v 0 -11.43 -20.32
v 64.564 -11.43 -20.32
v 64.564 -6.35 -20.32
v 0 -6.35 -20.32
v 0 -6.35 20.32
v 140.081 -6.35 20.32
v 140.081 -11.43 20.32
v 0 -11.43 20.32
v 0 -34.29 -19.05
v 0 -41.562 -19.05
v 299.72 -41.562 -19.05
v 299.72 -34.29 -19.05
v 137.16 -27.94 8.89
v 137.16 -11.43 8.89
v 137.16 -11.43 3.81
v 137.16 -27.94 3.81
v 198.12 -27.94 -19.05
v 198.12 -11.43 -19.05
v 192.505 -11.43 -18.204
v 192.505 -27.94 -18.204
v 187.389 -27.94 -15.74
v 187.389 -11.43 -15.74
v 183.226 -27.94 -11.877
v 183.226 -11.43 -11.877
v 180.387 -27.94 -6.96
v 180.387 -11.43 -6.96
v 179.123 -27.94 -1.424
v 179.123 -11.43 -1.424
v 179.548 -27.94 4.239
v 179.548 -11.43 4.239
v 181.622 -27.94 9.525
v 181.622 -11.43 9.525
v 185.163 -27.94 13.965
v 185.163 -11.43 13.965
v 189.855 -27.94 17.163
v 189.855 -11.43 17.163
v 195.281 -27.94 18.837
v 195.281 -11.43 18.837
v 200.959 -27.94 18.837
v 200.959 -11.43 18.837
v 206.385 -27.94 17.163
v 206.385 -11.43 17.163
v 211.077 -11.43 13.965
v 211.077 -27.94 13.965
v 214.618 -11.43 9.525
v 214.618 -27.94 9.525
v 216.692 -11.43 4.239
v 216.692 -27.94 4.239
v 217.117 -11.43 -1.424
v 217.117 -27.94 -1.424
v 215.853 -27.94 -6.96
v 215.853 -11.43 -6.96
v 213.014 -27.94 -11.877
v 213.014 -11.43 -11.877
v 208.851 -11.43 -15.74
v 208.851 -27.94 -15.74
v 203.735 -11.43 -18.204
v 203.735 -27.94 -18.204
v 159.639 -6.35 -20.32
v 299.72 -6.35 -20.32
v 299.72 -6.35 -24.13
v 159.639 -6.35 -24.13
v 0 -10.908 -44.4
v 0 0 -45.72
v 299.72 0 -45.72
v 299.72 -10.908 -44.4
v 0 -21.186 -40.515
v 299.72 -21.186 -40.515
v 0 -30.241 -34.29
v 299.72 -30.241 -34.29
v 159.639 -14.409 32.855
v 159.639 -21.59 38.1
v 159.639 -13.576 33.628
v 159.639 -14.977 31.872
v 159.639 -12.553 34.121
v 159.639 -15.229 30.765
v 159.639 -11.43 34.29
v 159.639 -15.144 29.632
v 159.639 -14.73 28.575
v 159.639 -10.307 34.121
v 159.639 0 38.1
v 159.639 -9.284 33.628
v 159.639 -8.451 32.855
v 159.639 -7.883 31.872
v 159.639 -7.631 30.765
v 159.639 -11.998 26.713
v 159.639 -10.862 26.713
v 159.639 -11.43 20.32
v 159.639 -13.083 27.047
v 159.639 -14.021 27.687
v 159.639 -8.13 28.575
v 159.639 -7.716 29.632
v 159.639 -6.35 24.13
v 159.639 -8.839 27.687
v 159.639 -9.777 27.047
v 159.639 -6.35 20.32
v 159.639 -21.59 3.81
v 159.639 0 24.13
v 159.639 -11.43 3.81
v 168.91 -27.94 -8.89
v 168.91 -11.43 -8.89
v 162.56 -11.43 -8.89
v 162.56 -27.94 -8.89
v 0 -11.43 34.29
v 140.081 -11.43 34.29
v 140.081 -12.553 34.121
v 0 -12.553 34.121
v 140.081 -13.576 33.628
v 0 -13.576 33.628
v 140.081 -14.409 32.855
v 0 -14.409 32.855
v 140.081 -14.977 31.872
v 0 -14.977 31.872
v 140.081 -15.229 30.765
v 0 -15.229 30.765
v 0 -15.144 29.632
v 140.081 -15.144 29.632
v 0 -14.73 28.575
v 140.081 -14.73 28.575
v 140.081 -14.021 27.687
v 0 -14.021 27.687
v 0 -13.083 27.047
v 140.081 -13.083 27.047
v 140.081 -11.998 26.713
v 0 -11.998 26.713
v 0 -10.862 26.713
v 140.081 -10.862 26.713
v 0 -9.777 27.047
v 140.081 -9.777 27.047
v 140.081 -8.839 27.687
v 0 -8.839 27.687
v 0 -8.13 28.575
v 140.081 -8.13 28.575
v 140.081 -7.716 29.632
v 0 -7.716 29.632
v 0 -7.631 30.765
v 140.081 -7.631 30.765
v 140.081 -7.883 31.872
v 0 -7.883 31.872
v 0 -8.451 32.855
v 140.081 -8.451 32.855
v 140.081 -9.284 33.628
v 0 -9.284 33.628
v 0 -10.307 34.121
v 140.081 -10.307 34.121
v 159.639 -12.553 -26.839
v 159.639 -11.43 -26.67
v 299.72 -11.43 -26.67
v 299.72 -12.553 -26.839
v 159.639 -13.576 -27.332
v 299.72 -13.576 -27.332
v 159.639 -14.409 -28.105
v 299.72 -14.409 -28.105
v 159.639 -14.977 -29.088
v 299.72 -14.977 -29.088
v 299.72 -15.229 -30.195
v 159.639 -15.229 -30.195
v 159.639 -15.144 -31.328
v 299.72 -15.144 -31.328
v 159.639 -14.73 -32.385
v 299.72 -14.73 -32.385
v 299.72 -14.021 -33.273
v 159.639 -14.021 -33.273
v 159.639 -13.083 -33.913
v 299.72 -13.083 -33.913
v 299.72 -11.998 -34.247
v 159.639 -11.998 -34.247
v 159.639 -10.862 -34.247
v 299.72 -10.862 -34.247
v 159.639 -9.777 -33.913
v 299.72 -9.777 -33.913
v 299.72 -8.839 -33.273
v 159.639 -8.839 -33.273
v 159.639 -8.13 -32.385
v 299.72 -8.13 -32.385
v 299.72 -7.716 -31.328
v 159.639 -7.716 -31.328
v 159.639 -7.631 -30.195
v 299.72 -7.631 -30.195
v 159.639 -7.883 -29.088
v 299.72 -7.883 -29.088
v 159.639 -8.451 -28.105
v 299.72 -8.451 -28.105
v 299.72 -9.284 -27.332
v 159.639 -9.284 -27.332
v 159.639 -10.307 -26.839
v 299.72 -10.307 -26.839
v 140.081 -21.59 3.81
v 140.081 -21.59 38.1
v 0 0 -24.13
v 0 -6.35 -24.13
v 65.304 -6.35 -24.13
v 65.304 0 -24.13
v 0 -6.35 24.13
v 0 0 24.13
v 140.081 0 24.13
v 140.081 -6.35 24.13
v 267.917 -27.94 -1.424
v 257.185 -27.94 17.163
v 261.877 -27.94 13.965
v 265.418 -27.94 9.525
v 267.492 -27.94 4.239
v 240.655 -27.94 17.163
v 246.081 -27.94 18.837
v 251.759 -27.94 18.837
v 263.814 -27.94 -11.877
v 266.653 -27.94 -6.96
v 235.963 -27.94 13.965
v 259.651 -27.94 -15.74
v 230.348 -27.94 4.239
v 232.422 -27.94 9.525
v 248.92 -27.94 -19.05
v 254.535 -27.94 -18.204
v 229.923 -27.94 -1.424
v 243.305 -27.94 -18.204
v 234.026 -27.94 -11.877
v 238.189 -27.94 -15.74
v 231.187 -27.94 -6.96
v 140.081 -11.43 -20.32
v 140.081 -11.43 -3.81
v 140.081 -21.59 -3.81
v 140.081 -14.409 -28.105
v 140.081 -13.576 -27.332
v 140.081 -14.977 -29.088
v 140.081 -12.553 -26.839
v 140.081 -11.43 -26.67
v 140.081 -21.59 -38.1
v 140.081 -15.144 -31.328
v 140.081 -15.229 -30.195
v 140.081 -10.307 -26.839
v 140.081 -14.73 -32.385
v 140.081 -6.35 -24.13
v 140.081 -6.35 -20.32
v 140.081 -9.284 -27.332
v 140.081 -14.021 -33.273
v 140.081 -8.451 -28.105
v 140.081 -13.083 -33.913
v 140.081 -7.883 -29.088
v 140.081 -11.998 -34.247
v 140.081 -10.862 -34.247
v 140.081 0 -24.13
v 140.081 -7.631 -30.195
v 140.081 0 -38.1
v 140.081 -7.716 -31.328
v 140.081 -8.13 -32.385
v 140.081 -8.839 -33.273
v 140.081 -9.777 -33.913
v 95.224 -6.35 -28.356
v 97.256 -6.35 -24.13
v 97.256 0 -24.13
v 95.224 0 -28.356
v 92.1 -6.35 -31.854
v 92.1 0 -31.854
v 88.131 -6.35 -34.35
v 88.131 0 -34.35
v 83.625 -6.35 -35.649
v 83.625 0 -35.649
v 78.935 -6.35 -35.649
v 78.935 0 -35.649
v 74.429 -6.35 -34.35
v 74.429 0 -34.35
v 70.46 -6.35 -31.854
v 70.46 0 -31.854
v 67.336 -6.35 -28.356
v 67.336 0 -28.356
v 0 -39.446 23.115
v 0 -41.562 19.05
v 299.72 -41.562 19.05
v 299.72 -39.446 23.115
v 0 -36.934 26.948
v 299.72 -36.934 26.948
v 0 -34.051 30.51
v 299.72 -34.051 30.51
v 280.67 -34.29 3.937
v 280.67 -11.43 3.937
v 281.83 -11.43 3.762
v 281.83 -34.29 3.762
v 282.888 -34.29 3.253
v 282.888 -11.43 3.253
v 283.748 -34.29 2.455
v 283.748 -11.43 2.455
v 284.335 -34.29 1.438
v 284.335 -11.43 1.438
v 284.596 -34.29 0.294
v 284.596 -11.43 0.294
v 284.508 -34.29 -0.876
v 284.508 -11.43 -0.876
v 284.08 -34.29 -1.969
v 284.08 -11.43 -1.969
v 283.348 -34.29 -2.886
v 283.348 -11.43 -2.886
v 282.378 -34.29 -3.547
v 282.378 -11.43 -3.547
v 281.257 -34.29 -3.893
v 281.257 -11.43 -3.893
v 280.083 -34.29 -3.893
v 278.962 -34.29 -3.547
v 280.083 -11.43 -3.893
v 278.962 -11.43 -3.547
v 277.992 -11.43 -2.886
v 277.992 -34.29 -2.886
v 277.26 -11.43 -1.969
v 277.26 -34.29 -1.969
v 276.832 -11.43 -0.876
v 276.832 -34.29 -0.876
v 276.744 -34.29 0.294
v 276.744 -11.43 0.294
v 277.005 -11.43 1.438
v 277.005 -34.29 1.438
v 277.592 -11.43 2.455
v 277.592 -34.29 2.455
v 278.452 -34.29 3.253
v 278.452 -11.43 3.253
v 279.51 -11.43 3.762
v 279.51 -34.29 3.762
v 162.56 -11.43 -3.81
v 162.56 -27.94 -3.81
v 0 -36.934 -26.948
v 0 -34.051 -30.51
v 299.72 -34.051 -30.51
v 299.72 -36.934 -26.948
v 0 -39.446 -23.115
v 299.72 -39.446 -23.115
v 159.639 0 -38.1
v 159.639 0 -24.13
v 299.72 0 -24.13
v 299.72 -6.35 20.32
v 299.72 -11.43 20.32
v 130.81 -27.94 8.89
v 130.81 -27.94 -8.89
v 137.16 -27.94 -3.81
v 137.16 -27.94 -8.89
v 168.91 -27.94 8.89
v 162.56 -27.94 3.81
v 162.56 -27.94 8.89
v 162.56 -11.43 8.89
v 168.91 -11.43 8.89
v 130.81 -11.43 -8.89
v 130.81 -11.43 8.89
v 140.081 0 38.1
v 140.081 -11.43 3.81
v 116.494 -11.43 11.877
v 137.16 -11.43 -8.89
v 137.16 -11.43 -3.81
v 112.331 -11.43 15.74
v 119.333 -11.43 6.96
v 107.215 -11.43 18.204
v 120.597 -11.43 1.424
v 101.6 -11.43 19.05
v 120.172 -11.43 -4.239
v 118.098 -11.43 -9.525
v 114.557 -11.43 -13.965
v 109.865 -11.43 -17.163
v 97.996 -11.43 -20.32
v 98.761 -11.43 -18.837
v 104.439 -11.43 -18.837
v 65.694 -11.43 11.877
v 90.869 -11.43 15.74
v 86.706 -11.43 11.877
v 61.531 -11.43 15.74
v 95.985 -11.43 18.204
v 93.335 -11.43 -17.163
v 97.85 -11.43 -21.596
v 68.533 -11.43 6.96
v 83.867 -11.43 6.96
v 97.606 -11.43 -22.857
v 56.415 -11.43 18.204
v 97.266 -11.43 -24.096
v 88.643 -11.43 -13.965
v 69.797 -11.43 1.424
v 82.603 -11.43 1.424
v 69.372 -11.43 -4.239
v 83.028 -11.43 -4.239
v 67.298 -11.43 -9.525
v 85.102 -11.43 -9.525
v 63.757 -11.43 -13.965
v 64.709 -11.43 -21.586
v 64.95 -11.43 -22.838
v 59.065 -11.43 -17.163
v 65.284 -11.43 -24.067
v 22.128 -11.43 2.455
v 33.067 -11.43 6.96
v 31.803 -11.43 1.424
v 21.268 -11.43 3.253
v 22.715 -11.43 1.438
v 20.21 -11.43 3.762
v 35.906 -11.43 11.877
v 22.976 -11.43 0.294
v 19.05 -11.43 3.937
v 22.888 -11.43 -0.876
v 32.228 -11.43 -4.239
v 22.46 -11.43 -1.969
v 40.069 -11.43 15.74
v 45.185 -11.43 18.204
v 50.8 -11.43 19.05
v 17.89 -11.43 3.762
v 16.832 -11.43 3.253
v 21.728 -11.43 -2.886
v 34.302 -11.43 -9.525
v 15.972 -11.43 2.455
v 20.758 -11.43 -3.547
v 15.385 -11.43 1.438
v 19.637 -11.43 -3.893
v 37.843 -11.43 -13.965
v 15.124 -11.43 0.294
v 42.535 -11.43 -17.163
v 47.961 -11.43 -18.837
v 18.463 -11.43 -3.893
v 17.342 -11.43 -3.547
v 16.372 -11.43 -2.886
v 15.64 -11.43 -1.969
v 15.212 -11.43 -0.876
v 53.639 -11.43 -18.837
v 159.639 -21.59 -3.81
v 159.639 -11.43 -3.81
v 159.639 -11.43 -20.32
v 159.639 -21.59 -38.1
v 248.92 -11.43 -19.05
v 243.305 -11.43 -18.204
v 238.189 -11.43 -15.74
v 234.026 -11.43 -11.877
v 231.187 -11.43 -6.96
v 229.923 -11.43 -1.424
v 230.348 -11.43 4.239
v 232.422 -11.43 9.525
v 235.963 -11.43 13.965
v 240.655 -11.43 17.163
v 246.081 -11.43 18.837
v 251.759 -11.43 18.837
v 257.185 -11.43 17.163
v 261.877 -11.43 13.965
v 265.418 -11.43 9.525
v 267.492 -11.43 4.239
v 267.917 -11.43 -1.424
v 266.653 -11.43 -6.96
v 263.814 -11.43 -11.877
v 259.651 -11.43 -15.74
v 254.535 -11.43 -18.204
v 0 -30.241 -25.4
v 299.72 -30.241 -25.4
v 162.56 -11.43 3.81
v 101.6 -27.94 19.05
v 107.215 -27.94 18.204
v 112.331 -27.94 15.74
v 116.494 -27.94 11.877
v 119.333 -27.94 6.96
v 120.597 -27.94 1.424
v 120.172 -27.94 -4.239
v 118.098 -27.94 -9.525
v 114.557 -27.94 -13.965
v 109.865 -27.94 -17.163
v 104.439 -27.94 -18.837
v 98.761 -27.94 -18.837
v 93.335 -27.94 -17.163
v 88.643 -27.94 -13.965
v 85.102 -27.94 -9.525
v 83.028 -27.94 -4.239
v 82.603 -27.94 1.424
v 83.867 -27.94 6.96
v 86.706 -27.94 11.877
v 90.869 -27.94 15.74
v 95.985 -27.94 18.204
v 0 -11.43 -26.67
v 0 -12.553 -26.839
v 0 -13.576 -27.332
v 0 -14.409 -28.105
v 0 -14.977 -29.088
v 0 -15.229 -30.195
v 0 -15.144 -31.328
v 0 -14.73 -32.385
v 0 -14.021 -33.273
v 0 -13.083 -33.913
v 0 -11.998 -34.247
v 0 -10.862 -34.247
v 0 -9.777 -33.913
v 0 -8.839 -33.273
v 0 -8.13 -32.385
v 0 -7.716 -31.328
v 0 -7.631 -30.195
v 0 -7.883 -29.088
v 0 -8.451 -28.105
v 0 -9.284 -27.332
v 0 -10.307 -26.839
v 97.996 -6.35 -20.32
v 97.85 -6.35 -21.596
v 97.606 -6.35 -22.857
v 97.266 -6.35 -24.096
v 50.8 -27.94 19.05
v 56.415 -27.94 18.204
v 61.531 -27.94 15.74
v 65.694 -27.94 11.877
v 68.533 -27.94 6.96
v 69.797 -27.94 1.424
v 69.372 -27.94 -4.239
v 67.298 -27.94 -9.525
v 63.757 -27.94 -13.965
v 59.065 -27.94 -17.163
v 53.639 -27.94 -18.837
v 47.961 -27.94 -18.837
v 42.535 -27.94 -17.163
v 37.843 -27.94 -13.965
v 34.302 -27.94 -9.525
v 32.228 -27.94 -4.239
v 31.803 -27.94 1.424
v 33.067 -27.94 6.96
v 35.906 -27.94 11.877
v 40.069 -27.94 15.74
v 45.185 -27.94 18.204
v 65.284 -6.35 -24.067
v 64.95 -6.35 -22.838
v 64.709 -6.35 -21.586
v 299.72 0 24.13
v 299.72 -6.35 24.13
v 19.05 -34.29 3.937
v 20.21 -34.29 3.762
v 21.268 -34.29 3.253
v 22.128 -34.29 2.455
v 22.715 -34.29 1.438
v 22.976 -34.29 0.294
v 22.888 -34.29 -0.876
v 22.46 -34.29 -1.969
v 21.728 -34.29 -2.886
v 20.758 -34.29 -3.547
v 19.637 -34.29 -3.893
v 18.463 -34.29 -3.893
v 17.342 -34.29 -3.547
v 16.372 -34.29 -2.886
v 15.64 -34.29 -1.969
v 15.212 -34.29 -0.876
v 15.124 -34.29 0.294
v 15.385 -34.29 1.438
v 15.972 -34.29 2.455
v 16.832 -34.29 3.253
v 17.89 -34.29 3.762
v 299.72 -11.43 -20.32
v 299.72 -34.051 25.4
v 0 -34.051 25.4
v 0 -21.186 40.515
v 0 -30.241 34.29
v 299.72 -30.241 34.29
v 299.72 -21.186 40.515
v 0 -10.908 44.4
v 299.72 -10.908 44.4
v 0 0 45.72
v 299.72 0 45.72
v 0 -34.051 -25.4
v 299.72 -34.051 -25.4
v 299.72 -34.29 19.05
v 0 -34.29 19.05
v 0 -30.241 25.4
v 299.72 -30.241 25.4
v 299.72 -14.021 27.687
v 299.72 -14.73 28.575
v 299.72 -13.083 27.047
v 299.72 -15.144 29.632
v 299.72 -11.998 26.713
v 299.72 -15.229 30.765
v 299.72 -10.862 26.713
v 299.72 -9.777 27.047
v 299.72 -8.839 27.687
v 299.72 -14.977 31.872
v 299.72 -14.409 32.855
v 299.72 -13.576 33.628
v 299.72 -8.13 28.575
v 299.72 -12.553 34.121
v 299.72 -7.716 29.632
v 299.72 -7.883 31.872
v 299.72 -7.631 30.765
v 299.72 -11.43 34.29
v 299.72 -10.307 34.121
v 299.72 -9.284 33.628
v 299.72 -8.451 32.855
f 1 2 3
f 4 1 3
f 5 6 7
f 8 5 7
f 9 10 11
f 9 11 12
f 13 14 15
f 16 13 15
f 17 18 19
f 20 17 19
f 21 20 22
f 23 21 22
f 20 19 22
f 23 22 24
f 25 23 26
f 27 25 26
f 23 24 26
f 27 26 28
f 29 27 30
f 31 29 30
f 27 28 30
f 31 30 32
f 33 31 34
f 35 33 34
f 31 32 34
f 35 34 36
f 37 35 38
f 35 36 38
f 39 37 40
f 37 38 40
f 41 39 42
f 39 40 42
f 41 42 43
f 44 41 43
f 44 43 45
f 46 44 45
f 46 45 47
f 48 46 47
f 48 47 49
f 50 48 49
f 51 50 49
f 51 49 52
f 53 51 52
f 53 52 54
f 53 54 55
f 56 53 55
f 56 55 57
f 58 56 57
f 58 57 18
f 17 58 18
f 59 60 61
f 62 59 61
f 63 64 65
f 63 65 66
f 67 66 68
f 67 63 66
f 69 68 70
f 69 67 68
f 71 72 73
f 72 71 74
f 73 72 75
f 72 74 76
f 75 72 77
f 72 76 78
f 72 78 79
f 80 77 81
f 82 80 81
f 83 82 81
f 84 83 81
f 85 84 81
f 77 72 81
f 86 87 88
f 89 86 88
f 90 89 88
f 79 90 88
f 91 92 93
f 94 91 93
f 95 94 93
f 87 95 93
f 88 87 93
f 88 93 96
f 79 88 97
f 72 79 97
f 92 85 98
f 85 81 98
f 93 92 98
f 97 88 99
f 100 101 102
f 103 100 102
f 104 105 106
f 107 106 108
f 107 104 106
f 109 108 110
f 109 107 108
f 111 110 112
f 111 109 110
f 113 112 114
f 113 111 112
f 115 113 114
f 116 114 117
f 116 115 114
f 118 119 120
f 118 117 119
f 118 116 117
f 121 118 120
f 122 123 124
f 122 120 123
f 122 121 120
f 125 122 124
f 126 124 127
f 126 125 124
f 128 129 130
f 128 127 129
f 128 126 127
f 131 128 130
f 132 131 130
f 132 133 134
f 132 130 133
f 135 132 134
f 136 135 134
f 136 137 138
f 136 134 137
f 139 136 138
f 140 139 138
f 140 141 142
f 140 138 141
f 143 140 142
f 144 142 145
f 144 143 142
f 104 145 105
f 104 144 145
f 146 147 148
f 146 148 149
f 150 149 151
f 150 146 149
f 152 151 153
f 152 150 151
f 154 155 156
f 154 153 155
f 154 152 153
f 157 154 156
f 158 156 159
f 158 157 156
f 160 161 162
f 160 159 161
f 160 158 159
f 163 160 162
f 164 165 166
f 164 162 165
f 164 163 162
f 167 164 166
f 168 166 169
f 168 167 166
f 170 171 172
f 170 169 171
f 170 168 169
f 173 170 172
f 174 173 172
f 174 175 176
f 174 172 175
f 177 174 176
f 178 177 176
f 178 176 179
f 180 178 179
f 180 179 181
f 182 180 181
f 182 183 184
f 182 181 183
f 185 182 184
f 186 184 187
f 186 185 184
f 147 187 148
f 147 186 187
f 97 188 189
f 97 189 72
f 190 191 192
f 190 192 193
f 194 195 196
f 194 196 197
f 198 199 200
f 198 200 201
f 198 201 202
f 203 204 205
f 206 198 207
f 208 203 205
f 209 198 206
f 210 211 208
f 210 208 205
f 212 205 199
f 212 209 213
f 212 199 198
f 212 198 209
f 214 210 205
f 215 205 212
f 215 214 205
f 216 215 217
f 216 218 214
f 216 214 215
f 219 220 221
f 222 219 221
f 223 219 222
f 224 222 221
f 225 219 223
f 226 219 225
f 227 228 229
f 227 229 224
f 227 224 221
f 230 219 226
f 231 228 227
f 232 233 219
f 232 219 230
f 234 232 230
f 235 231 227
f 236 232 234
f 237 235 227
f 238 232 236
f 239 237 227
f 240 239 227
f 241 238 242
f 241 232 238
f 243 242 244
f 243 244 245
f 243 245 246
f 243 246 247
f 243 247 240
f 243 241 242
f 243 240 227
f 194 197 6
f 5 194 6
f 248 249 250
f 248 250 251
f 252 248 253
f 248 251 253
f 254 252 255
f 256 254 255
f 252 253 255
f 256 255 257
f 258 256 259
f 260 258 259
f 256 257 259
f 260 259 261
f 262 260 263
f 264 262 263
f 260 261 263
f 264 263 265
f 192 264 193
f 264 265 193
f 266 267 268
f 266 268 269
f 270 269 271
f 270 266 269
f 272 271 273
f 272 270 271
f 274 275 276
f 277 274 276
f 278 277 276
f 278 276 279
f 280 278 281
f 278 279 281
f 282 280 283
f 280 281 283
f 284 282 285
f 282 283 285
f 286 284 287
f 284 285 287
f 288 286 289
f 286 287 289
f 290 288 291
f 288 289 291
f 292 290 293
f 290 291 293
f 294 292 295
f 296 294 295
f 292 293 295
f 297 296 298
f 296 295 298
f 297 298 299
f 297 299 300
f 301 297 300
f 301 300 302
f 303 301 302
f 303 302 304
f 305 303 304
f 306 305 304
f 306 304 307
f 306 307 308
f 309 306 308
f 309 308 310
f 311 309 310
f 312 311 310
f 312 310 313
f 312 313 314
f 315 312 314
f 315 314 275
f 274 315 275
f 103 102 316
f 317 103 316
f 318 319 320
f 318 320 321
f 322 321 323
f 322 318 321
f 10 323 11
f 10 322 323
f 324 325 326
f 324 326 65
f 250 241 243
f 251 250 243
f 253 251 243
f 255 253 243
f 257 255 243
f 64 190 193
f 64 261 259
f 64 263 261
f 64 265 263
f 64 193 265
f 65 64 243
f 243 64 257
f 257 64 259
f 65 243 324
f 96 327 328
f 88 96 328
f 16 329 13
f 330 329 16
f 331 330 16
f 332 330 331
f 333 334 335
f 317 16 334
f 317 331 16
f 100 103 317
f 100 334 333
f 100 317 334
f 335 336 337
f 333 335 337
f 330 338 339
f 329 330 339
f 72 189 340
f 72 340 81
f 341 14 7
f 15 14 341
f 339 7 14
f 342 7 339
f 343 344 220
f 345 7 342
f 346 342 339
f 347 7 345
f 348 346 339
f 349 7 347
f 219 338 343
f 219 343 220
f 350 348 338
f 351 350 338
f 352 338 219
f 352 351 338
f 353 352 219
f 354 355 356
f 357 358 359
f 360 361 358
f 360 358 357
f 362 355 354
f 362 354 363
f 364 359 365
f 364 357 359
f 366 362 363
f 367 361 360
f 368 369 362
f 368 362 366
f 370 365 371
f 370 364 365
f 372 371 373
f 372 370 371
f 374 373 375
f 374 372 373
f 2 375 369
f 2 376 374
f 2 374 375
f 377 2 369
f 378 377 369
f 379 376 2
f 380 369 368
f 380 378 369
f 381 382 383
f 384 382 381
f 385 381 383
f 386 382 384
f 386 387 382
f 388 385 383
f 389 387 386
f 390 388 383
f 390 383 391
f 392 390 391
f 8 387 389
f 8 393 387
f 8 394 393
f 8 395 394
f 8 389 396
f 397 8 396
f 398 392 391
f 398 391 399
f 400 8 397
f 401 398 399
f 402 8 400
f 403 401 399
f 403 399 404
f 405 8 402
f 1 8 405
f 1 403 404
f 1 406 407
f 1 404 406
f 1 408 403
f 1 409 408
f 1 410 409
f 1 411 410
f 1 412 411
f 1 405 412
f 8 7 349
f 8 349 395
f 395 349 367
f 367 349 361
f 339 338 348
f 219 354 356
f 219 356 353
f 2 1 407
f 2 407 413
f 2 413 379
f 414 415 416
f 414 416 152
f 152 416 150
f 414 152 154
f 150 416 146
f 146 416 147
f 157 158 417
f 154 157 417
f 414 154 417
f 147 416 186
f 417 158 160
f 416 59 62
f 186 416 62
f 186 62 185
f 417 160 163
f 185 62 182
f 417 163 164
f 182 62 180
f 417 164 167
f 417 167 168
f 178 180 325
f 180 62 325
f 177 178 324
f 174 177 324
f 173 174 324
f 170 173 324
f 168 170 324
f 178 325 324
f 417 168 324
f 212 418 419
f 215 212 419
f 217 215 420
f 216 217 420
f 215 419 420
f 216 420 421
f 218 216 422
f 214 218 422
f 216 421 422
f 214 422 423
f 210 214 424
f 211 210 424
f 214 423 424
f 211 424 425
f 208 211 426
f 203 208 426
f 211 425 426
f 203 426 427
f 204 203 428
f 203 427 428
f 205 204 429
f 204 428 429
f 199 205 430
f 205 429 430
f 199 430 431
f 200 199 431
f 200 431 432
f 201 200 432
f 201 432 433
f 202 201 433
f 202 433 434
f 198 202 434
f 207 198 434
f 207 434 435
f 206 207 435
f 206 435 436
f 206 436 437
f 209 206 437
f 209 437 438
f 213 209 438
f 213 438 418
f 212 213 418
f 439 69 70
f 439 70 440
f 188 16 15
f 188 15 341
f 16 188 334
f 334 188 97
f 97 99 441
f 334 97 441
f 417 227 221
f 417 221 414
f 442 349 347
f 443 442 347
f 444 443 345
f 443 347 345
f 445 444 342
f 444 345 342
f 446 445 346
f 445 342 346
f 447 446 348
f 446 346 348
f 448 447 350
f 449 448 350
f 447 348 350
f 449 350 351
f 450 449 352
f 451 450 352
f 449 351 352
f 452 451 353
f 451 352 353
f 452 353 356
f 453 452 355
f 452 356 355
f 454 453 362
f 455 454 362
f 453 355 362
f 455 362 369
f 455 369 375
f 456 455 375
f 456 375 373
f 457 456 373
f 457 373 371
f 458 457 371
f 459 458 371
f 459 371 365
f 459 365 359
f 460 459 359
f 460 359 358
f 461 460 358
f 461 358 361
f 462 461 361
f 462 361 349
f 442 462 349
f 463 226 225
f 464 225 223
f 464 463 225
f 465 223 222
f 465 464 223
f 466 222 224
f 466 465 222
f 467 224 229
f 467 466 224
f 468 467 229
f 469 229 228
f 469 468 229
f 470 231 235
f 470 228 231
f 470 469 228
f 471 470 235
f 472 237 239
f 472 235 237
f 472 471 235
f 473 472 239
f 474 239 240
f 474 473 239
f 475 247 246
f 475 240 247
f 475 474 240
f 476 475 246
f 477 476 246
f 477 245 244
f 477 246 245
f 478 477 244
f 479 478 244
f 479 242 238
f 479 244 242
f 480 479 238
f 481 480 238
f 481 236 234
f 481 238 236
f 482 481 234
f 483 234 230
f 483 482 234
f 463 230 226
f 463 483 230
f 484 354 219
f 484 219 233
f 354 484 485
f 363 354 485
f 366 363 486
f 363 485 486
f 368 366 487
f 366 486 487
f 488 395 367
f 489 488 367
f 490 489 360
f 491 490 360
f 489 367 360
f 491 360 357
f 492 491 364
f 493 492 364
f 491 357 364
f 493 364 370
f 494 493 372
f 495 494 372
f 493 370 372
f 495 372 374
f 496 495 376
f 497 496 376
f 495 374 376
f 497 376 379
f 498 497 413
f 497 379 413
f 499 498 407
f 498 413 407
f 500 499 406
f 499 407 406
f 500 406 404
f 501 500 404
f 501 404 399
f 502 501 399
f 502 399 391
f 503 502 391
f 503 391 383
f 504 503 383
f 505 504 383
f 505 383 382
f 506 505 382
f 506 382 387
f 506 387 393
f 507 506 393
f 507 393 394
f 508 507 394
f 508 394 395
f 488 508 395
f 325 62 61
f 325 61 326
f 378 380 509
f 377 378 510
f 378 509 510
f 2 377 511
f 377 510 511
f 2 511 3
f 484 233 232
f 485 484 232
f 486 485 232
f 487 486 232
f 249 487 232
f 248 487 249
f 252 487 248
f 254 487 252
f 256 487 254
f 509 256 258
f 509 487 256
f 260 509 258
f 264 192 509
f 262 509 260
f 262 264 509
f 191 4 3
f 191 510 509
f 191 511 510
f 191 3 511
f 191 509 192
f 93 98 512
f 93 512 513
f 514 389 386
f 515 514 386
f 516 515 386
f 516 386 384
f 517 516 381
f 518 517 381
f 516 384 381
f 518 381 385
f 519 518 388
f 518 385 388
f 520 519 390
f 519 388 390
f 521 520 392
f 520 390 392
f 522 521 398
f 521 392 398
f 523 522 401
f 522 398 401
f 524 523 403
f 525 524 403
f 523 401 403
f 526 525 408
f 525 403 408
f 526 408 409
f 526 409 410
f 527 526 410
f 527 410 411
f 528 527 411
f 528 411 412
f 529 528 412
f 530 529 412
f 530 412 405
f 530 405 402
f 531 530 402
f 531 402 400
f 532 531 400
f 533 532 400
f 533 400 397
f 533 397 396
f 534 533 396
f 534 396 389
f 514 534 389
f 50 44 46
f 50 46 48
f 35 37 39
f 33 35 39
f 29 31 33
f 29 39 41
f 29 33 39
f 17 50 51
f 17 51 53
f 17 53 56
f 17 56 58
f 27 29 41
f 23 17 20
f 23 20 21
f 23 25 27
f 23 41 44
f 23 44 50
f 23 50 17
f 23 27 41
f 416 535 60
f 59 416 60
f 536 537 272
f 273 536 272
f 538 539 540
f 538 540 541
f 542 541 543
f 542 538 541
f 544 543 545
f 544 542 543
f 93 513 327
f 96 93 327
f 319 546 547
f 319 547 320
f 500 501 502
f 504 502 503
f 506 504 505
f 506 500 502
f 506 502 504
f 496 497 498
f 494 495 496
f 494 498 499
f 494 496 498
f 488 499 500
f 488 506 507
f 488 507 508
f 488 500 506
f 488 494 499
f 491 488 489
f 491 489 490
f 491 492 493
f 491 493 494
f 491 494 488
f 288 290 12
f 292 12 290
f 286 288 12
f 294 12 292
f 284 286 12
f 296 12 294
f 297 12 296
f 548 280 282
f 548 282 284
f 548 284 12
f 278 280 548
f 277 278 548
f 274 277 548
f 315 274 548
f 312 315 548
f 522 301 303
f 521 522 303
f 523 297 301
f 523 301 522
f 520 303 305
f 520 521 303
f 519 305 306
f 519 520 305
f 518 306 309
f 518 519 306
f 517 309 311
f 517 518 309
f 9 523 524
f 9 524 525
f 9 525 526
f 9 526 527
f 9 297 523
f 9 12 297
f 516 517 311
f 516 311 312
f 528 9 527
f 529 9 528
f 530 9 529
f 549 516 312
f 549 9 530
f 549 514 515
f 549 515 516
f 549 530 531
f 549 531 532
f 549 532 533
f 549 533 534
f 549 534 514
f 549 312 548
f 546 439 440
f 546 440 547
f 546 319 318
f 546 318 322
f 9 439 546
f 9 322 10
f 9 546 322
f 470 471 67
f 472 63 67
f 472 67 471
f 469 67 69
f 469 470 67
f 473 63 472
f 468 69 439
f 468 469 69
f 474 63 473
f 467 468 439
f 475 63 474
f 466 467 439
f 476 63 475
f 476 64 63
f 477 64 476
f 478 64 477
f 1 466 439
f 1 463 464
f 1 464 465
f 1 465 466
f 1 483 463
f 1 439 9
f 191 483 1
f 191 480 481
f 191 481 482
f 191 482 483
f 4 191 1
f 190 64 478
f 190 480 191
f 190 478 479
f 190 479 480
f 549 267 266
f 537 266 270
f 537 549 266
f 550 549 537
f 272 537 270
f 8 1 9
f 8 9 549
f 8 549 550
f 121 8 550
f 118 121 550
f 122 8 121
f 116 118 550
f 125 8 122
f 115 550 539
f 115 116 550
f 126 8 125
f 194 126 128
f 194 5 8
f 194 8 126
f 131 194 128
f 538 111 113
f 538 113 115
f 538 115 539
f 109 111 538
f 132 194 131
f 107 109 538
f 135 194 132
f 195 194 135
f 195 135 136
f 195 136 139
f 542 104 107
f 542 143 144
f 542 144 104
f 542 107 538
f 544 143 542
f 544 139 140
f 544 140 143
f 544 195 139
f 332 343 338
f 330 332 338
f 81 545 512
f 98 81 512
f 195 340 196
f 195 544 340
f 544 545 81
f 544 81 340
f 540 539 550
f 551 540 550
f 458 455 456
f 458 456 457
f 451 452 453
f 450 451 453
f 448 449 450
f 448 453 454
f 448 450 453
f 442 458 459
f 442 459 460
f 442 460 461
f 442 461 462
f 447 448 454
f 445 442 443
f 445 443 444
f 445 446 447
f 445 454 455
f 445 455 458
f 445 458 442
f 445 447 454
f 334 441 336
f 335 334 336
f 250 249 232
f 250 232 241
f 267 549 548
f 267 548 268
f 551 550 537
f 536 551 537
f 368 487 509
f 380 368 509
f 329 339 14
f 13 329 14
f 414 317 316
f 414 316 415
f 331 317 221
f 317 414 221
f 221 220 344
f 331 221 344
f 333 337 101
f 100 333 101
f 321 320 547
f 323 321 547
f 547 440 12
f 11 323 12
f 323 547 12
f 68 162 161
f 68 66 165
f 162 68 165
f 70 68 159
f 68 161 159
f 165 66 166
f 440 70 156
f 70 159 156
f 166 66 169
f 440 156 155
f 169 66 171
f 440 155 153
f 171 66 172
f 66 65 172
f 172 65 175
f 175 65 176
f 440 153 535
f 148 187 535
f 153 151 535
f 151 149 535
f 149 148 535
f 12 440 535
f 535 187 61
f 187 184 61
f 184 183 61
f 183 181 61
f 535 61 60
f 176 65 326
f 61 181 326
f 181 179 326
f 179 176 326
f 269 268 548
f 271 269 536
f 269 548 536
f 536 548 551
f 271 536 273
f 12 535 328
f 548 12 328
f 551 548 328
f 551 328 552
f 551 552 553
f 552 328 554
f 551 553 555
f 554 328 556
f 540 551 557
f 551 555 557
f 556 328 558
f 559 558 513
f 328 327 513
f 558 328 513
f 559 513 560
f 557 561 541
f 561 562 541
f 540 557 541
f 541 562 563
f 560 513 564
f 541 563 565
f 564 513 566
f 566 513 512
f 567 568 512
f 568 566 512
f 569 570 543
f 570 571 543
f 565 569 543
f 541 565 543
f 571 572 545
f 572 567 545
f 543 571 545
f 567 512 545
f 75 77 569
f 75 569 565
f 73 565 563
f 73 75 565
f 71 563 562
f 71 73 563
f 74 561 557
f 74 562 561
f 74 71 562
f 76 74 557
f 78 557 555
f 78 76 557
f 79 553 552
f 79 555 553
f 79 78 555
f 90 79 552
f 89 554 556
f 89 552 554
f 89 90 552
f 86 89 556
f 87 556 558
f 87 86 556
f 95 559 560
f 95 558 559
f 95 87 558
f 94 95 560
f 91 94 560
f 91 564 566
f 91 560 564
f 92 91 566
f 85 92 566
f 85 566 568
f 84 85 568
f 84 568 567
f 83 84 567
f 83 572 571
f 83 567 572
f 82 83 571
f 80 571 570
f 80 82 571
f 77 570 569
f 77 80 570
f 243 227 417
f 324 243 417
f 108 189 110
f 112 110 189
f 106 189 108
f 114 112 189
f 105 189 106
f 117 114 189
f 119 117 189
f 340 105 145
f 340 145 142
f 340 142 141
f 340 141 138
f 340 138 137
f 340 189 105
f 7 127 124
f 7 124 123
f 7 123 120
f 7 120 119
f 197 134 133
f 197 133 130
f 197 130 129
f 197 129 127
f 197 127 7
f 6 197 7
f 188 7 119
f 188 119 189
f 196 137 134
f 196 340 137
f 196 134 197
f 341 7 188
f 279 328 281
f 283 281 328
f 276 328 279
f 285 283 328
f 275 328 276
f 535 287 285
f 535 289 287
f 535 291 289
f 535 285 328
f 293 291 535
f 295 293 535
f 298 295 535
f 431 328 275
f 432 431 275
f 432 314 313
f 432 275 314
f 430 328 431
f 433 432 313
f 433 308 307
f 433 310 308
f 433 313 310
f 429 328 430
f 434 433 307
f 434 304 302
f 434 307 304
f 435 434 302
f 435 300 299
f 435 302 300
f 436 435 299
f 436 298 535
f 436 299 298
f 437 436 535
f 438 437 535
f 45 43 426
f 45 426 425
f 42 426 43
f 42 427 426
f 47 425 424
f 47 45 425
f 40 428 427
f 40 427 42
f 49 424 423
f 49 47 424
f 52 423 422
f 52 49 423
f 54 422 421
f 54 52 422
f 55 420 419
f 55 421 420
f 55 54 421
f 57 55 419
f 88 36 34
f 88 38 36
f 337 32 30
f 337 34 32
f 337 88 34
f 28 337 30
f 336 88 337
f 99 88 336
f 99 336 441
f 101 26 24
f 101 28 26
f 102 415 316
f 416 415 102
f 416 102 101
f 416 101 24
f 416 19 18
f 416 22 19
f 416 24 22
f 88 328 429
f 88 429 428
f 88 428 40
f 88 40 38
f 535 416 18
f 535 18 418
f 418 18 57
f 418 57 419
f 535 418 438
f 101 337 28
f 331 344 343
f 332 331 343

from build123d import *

# Parameters (mm, degrees)
SLED_DEPTH                       = 299.72
SKETCH12_R                       = 19.05
SPRING_INSERTS_DEPTH             = 27.94
SKETCH4_R                        = 3.81
THREADED_ROD_SLOTS_DEPTH         = 304.8
SKETCH13_W                       = 19.558
SKETCH13_H                       = 76.2
SPRING_PLATE_SLOT_DEPTH          = 21.59
MOD_TO_FIT_IN_COUPLER_DEPTH      = 320.04
MOD_TO_FIT_IN_COUPLER_DEPTH_BACK = 77.47
SKETCH17_R                       = 3.937
CAN_CORD_HOLES_DEPTH             = 62.992
INSERTION_GUIDE_RAILS_DEPTH      = 314.452
LOCKING_PIN_DEPTH                = 27.94
SKETCH20_R                       = 16.764
CUT_EXTRUDE1_DEPTH               = 6.35
CUT_EXTRUDE2_DEPTH               = 11.43


with BuildPart() as part:
    # Sketch3 → Sled (new body)
    with BuildSketch(Plane(origin=(0, 0, 0), x_dir=(0, 0, -1), z_dir=(1, 0, 0))):
        with BuildLine():
            Line((-49.53, 0), (-24.13, 0))
            Line((-24.13, 0), (-24.13, -6.35))
            Line((-24.13, -6.35), (-20.32, -6.35))
            Line((-20.32, -6.35), (-20.32, -11.43))
            Line((-20.32, -11.43), (20.32, -11.43))
            Line((20.32, -11.43), (20.32, -6.35))
            Line((20.32, -6.35), (24.13, -6.35))
            Line((24.13, -6.35), (24.13, 0))
            Line((24.13, 0), (49.53, 0))
            ThreePointArc((49.53, 0), (41.211451079, -27.474300719), (19.05, -45.72))
            Line((19.05, -45.72), (19.05, -34.29))
            Line((19.05, -34.29), (-19.05, -34.29))
            Line((-19.05, -34.29), (-19.05, -45.72))
            ThreePointArc((-19.05, -45.72), (-41.211451079, -27.474300719), (-49.53, 0))
        make_face()
    extrude(amount=SLED_DEPTH)

    # Sketch12 → Spring Inserts (cut)
    with BuildSketch(Plane(origin=(0, 0, 0), x_dir=(1, 0, 0), z_dir=(0, 1, 0))):
        with Locations(Location((50.8, 0, 0), (0, 0, 270))):
            Circle(SKETCH12_R)
        with Locations(Location((248.92, 0, 0), (0, 0, 90))):
            Circle(SKETCH12_R)
        with Locations(Location((101.6, 0, 0), (0, 0, 270))):
            Circle(SKETCH12_R)
        with Locations(Location((198.12, 0, 0), (0, 0, 90))):
            Circle(SKETCH12_R)
    extrude(amount=-SPRING_INSERTS_DEPTH, mode=Mode.SUBTRACT)

    # Sketch4 → Threaded Rod Slots (cut)
    with BuildSketch(Plane(origin=(0, 0, 0), x_dir=(0, 0, -1), z_dir=(1, 0, 0))):
        with Locations(Location((-30.48, -11.43, 0), (0, 0, 180))):
            Circle(SKETCH4_R)
        with Locations(Location((30.48, -11.43, 0), (0, 0, 180))):
            Circle(SKETCH4_R)
    extrude(amount=THREADED_ROD_SLOTS_DEPTH, mode=Mode.SUBTRACT)

    # Sketch13 → Spring Plate Slot (cut)
    with BuildSketch(Plane(origin=(0, 0, 0), x_dir=(1, 0, 0), z_dir=(0, 1, 0))):
        with Locations((149.86, 0)):
            Rectangle(SKETCH13_W, SKETCH13_H)
    extrude(amount=-SPRING_PLATE_SLOT_DEPTH, mode=Mode.SUBTRACT)

    # Sketch16 → Mod to fit in coupler (cut, two sides: drawn at the far end of the back side and taken through both)
    with BuildSketch(Plane(origin=(0, 0, 0), x_dir=(0, 0, -1), z_dir=(1, 0, 0)).offset(-MOD_TO_FIT_IN_COUPLER_DEPTH_BACK)):
        with BuildLine():
            Line((-45.397424247, 5.421463987), (-55.982128016, 1.685686186))
            Line((-55.982128016, 1.685686186), (-46.435140302, -53.451626912))
            Line((-46.435140302, -53.451626912), (-2.643522748, -59.401198965))
            Line((-2.643522748, -59.401198965), (46.059950804, -46.118433451))
            Line((46.059950804, -46.118433451), (57.336465277, 3.138488664))
            Line((57.336465277, 3.138488664), (45.312886192, 6.087753686))
            ThreePointArc((45.312886192, 6.087753686), (0.335815666, -45.718766692), (-45.397424247, 5.421463987))
        make_face()
    extrude(amount=MOD_TO_FIT_IN_COUPLER_DEPTH + MOD_TO_FIT_IN_COUPLER_DEPTH_BACK, mode=Mode.SUBTRACT)

    # Sketch17 → Can Cord Holes (cut)
    with BuildSketch(Plane(origin=(0, 0, 0), x_dir=(1, 0, 0), z_dir=(0, 1, 0))):
        with Locations(Location((280.67, 0, 0), (0, 0, 270))):
            Circle(SKETCH17_R)
        with Locations(Location((19.05, 0, 0), (0, 0, 270))):
            Circle(SKETCH17_R)
    extrude(amount=-CAN_CORD_HOLES_DEPTH, mode=Mode.SUBTRACT)

    # Sketch18 → Insertion Guide Rails (cut)
    with BuildSketch(Plane(origin=(0, 0, 0), x_dir=(0, 0, -1), z_dir=(1, 0, 0))):
        Polygon((-34.29, -30.240937485), (-25.4, -30.240937485), (-25.4, -34.050937485), (-30.50986818, -34.050937485), (-38.766826884, -32.646576067), align=None)
        Polygon((25.4, -34.050937485), (30.50986818, -34.050937485), (38.766826884, -32.646576067), (34.29, -30.240937485), (25.4, -30.240937485), align=None)
    extrude(amount=INSERTION_GUIDE_RAILS_DEPTH, mode=Mode.SUBTRACT)

    # Sketch19 → Locking Pin (cut)
    with BuildSketch(Plane(origin=(0, 0, 0), x_dir=(1, 0, 0), z_dir=(0, 1, 0))):
        Polygon((162.56, 3.81), (137.16, 3.81), (137.16, 8.89), (130.81, 8.89), (130.81, -8.89), (137.16, -8.89), (137.16, -3.81), (162.56, -3.81), (162.56, -8.89), (168.91, -8.89), (168.91, 8.89), (162.56, 8.89), align=None)
    extrude(amount=-LOCKING_PIN_DEPTH, mode=Mode.SUBTRACT)

    # Sketch20 → Cut-Extrude1 (cut)
    with BuildSketch(Plane(origin=(0, 0, 0), x_dir=(1, 0, 0), z_dir=(0, 1, 0))):
        with Locations((81.28, 19.05)):
            Circle(SKETCH20_R)
    extrude(amount=-CUT_EXTRUDE1_DEPTH, mode=Mode.SUBTRACT)

    # Sketch21 → Cut-Extrude2 (cut)
    with BuildSketch(Plane(origin=(0, 0, 0), x_dir=(1, 0, 0), z_dir=(0, 1, 0))):
        with BuildLine():
            Line((97.266479016, 24.096204976), (65.284485664, 24.067491117))
            ThreePointArc((65.284485664, 24.067491117), (81.295050936, 2.286006756), (97.266479016, 24.096204976))
        make_face()
    extrude(amount=-CUT_EXTRUDE2_DEPTH, mode=Mode.SUBTRACT)


solid = part.part
